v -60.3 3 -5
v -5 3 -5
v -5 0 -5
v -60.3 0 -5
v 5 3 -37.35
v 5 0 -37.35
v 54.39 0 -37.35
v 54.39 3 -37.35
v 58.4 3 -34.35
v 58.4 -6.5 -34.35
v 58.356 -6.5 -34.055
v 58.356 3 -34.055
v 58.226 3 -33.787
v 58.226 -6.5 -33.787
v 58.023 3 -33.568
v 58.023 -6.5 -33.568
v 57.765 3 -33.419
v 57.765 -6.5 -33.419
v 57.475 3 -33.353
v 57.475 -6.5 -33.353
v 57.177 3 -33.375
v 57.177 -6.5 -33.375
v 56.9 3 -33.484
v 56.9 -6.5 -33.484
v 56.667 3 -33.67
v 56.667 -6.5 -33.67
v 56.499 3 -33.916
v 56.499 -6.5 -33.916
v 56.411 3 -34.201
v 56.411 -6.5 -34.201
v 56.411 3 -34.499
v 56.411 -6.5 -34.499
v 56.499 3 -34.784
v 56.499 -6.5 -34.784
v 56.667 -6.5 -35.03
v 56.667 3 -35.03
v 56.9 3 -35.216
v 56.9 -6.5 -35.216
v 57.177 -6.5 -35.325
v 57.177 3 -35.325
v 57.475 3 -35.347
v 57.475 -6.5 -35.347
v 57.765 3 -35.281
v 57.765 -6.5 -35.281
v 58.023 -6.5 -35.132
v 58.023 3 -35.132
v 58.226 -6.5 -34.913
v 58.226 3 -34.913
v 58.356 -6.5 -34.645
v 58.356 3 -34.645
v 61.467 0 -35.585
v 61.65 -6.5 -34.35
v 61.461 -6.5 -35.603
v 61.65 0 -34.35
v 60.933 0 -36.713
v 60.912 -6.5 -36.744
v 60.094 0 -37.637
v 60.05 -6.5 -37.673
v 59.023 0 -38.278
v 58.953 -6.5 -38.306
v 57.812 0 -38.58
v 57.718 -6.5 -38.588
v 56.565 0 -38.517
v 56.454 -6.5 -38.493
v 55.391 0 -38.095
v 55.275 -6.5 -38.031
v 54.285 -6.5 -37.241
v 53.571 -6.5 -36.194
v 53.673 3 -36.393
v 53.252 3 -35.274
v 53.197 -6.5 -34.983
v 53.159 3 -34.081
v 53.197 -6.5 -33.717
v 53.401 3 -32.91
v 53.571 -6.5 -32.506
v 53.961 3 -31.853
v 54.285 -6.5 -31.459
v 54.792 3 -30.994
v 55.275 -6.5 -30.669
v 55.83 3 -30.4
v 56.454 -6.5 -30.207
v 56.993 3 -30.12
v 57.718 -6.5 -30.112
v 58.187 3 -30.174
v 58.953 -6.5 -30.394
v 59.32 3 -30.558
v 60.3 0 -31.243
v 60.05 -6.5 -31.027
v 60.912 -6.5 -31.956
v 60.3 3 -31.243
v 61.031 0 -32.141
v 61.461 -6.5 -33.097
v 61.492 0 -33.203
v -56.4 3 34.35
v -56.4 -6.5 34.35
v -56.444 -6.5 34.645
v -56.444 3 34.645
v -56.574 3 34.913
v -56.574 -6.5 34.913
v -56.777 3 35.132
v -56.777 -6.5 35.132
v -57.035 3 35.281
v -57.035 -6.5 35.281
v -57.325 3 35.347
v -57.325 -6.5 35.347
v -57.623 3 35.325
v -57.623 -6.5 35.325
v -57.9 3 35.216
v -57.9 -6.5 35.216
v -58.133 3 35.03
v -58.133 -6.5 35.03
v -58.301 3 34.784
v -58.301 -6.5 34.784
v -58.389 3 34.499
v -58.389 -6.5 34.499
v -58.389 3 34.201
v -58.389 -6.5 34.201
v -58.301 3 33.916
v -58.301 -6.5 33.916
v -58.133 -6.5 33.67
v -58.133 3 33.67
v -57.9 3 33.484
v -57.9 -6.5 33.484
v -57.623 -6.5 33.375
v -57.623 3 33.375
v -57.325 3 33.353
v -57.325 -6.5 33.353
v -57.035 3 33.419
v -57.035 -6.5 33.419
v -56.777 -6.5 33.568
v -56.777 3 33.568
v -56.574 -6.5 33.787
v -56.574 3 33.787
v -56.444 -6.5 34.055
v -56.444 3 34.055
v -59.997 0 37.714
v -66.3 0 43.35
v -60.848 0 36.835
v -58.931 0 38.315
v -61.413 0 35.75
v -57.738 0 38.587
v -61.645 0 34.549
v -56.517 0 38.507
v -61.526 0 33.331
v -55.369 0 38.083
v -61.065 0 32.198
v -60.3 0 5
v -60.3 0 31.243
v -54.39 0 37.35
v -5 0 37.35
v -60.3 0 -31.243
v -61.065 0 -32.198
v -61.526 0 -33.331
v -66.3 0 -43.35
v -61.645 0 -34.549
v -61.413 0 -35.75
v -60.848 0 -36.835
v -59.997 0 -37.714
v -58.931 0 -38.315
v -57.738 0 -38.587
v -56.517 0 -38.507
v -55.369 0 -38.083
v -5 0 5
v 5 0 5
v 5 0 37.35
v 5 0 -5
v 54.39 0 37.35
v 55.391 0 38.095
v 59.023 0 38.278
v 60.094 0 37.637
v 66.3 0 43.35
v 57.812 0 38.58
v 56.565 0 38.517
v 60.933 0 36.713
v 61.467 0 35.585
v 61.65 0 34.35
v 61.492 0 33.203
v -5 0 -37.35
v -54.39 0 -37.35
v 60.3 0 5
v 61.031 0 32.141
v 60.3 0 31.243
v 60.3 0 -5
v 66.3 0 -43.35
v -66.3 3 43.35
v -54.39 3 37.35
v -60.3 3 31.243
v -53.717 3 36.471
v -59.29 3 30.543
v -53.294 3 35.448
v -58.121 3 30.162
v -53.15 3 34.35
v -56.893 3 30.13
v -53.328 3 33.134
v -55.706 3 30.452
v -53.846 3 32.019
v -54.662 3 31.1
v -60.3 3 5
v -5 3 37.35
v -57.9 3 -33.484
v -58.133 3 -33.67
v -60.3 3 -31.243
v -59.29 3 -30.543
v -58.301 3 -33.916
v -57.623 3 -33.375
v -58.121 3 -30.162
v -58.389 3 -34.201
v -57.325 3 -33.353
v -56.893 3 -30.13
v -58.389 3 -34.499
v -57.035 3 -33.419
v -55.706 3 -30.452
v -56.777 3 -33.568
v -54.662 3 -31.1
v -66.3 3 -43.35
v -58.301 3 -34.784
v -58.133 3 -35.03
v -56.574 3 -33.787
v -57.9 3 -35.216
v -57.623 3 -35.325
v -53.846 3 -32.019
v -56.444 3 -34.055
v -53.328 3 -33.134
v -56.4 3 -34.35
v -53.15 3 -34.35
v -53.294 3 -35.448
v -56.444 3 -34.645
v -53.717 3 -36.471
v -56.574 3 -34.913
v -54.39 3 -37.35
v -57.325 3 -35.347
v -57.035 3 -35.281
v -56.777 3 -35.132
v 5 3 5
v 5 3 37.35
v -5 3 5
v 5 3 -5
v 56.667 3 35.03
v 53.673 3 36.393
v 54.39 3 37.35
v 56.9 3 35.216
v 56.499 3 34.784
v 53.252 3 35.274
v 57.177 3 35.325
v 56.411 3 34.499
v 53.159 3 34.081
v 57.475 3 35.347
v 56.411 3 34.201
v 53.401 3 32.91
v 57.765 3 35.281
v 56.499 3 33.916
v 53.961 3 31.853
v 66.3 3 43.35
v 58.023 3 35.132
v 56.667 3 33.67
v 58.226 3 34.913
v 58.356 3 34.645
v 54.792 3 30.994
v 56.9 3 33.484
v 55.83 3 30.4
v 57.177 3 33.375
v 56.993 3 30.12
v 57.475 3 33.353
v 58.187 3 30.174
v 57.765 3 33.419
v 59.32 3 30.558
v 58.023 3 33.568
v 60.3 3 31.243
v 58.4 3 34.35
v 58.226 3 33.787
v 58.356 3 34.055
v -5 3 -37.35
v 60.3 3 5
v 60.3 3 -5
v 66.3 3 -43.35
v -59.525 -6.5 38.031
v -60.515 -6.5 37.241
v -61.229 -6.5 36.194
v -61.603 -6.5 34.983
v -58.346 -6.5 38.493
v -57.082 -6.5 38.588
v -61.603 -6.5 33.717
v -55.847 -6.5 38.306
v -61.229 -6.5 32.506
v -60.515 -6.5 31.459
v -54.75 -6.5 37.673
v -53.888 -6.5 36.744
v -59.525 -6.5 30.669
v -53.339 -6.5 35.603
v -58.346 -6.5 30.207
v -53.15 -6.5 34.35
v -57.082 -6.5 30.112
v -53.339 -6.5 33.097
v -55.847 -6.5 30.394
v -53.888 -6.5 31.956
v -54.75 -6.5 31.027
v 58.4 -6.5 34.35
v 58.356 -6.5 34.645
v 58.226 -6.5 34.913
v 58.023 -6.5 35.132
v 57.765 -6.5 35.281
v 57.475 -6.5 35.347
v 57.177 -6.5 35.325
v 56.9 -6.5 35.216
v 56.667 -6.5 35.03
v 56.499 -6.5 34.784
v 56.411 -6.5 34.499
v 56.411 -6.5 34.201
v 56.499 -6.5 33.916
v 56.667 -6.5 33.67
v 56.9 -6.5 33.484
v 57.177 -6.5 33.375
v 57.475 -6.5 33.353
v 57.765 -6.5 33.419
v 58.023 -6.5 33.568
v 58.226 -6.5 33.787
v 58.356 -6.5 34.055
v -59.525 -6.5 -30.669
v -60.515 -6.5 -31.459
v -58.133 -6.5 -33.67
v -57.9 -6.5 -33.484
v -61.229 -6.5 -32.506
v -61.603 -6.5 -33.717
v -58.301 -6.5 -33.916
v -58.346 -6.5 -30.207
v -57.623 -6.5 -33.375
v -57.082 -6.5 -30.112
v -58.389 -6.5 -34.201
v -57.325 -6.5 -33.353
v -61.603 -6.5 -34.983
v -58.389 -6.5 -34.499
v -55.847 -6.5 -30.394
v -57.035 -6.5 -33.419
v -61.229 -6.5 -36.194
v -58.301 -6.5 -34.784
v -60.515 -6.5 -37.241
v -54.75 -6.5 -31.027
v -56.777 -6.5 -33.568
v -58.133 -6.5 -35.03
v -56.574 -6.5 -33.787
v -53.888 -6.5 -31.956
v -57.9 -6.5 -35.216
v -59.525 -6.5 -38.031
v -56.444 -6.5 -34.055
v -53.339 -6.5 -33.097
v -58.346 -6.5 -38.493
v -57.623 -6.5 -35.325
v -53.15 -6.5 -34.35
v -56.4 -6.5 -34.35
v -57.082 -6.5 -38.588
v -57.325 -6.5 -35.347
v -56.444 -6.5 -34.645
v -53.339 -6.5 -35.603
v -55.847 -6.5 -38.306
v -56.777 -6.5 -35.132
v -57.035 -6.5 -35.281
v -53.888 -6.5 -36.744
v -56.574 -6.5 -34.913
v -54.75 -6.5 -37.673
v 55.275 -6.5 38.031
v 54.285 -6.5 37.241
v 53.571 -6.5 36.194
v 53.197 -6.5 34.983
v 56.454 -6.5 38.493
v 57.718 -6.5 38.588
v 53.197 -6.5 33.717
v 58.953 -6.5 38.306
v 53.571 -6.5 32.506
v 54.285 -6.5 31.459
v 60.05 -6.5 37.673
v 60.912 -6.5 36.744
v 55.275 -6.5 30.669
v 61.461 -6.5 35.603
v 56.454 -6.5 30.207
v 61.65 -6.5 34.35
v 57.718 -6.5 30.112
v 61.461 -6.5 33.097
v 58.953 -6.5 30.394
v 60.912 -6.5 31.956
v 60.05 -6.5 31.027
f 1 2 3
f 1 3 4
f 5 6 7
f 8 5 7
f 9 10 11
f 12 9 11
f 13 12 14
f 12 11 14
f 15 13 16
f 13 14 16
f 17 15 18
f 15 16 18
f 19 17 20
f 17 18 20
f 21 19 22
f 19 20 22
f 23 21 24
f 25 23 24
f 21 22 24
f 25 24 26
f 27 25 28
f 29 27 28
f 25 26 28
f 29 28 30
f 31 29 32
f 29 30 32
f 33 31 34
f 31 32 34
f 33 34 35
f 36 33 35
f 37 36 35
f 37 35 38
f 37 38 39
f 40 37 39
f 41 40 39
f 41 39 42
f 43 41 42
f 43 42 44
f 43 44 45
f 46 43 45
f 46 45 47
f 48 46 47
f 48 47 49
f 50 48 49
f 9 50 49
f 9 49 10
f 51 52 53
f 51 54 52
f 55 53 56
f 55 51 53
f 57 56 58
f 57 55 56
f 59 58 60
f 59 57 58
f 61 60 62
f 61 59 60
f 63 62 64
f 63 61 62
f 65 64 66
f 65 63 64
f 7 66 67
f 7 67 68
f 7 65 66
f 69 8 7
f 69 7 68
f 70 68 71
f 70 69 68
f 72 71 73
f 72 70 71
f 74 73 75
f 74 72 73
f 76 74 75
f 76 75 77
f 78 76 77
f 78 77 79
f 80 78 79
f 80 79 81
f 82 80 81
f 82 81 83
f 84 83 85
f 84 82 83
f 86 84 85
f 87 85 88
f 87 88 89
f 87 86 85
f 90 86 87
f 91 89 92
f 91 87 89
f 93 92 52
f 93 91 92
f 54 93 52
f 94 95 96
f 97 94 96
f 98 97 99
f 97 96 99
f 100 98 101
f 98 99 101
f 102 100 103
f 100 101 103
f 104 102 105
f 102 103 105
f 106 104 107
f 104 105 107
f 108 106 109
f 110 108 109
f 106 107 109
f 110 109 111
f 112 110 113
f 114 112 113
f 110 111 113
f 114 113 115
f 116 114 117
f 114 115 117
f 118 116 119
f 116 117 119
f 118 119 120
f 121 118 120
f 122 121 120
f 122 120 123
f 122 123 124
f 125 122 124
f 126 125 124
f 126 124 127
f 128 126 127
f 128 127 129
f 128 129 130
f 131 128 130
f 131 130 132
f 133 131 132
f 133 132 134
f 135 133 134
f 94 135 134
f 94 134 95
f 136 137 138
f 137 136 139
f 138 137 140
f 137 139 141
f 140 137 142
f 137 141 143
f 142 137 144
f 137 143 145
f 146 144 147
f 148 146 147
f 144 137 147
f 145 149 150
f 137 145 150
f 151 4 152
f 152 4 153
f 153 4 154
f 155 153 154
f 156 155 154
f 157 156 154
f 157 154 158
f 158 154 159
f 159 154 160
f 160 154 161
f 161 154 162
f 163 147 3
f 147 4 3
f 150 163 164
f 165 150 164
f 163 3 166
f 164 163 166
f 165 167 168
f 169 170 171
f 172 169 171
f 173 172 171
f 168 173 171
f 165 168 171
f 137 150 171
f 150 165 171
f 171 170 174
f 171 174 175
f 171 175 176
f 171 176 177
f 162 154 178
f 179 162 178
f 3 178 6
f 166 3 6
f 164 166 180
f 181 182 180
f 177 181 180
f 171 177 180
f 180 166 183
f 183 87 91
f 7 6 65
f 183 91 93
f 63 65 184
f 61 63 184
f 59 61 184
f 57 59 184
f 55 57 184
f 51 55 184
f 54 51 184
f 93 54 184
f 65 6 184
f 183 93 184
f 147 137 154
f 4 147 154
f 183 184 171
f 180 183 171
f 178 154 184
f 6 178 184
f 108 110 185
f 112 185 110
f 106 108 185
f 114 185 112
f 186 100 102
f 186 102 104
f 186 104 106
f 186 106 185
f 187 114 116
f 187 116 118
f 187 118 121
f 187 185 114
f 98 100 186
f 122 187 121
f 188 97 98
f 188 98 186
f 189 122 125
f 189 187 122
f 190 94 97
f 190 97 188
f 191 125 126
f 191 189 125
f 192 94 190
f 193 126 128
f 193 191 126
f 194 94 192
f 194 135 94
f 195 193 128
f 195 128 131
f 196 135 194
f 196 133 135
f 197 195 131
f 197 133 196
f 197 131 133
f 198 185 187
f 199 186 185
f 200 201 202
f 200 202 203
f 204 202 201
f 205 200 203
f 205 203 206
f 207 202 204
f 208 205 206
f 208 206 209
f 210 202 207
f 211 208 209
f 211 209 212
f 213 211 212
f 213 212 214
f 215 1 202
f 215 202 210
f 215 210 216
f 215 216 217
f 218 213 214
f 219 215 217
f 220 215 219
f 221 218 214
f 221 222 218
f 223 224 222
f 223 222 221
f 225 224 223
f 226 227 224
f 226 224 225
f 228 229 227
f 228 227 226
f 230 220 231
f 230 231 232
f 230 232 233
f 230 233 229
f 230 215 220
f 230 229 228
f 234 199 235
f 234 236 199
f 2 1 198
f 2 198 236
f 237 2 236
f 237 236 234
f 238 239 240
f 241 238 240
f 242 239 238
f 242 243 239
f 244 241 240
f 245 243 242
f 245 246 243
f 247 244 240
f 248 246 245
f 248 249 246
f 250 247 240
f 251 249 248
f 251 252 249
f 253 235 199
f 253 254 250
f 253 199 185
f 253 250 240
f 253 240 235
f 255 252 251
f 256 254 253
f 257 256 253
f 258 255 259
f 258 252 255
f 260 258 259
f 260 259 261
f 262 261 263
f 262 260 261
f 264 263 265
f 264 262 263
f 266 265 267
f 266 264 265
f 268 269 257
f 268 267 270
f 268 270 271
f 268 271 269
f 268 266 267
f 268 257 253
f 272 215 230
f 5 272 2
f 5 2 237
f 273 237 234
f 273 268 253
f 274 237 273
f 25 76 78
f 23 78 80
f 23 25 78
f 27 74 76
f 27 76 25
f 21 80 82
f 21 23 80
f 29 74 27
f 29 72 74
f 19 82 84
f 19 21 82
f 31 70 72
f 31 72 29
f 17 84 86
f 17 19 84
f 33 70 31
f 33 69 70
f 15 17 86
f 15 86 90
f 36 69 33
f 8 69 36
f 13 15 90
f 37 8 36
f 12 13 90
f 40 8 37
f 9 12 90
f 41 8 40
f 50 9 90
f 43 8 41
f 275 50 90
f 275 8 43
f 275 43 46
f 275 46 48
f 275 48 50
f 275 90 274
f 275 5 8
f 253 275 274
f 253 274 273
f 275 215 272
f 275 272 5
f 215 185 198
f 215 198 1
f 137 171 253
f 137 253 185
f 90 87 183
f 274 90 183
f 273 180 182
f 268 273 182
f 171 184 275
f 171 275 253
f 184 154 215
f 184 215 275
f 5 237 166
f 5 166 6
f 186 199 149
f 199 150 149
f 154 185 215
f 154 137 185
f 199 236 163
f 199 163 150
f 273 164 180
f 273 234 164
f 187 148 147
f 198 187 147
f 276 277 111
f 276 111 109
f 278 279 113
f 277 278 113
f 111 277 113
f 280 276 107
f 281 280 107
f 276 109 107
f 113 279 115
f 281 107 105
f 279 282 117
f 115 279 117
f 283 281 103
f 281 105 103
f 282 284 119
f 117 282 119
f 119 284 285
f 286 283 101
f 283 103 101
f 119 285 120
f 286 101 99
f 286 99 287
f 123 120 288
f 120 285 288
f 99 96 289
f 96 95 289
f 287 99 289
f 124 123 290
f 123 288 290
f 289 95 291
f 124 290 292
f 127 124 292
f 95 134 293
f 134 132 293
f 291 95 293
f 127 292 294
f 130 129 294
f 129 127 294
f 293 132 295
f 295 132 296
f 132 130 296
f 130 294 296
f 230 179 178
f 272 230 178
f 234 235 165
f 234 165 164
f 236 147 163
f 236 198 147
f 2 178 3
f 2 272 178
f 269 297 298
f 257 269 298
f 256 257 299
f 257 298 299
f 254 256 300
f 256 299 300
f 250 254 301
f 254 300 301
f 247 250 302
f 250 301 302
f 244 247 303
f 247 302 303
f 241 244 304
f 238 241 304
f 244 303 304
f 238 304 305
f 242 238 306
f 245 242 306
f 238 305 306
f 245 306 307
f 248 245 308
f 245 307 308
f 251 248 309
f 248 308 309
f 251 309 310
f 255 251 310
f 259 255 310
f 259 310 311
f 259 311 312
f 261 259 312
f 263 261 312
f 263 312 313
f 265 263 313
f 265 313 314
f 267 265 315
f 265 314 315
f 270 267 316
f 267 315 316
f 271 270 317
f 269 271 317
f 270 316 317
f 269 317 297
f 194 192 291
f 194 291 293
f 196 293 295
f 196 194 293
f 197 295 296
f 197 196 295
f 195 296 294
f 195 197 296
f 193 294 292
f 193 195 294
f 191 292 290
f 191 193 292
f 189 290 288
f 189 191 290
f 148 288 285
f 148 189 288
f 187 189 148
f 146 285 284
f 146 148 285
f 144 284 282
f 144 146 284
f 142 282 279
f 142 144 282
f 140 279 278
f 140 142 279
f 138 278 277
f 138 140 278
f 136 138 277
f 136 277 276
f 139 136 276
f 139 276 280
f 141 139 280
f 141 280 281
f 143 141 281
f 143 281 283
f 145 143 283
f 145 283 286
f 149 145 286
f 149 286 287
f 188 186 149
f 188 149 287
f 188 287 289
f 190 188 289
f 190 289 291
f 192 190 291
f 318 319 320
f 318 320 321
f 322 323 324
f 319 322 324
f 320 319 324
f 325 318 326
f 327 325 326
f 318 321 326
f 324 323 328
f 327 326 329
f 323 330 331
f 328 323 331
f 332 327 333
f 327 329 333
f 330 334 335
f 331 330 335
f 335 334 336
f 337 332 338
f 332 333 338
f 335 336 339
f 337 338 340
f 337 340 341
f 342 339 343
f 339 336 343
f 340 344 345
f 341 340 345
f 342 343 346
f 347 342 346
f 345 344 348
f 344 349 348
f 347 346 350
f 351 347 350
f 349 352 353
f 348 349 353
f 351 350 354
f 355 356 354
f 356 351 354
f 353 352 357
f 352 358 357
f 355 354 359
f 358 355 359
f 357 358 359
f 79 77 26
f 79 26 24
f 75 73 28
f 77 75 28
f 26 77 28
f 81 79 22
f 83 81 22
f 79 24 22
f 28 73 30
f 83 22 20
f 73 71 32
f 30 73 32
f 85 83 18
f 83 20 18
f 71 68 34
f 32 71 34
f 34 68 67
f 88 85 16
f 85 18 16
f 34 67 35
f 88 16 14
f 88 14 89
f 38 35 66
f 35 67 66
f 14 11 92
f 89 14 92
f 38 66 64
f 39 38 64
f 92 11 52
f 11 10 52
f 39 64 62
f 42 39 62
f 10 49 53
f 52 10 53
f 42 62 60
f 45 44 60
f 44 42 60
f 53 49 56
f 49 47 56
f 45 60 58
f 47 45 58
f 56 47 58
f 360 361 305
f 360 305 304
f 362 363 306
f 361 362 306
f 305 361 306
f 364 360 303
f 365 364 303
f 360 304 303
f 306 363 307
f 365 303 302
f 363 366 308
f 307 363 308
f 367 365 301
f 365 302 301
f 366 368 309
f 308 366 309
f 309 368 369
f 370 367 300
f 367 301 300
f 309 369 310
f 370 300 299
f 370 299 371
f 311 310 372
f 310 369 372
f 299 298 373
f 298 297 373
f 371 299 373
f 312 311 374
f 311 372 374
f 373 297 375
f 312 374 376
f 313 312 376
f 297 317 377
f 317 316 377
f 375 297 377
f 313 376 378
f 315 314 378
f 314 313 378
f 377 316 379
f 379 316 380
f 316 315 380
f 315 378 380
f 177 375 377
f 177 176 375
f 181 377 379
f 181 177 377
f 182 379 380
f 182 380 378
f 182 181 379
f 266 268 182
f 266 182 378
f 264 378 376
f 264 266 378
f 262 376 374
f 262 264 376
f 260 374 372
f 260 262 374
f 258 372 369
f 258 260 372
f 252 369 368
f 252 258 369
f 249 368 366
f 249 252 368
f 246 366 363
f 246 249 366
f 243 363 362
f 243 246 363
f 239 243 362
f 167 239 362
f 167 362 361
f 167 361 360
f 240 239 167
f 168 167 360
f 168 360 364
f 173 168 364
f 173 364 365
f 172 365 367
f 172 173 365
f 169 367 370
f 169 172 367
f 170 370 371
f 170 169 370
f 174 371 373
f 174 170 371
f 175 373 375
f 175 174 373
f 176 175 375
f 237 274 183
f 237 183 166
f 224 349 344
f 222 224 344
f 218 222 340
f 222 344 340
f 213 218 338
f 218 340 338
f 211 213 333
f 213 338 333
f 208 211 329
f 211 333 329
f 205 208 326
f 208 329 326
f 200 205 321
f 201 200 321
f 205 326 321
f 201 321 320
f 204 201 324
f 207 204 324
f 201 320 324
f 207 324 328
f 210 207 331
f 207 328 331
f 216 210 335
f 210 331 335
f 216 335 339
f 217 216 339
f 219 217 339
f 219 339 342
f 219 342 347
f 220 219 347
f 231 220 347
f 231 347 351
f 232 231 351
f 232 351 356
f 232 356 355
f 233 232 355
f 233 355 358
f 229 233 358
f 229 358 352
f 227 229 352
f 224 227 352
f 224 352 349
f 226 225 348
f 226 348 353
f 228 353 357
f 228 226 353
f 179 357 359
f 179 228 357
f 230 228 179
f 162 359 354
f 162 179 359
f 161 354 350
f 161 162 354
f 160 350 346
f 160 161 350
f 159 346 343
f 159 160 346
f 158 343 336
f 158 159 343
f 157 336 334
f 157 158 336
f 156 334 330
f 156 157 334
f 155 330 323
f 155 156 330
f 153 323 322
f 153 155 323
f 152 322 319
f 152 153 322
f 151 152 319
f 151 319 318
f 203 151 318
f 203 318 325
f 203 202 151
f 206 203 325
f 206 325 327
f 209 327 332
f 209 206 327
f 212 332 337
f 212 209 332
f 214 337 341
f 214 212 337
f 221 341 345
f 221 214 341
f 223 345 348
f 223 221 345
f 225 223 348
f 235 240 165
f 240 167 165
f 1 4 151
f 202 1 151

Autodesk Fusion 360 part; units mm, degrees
sketch "Sketch1" plane through (0, 0, 0) normal (0, 1, 0) x (1, 0, 0)
  line L0 (60.3, -37.35) -> (-60.3, -37.35)
  line L1 (-60.3, -37.35) -> (-60.3, 31.2432)
  line L2 (-60.3, 37.35) -> (60.3, 37.35)
  line L3 (60.3, 37.35) -> (60.3, -37.35)
  line L4 (60.3, -37.35) -> (-60.3, 37.35) construction
  line L5 (-60.3, -37.35) -> (60.3, 37.35) construction
  line L6 (-66.3, 43.35) -> (66.3, 43.35)
  line L7 (66.3, 43.35) -> (66.3, -43.35)
  line L8 (66.3, -43.35) -> (-66.3, -43.35)
  line L9 (-66.3, -43.35) -> (-66.3, 43.35)
  line L10 (-60.3, -37.35) -> (-54.5, -37.35)
  line L11 (-60.3, -31.35) -> (-60.3, -37.35)
  line L12 (60.3, -37.35) -> (54.5, -37.35)
  line L13 (60.3, -31.35) -> (60.3, -37.35)
  line L14 (-60.3, 37.35) -> (-54.5, 37.35)
  line L15 (-60.3, 31.35) -> (-60.3, 37.35)
  line L16 (60.3, 37.35) -> (54.5, 37.35)
  line L17 (60.3, 31.35) -> (60.3, 37.35)
  circle A0 centre (-57.4, -34.35) radius 1
  circle A1 centre (57.4, -34.35) radius 1
  line L18 (2.5, 0) -> (20, 0)
  circle A2 centre (57.4, 34.35) radius 1
  circle A3 centre (-57.4, 34.35) radius 1
  circle A4 centre (0, -40.35) radius 1
  circle A5 centre (0, 40.35) radius 1
  circle A6 centre (57.4, -34.35) radius 4.25
  circle A7 centre (57.4, 34.35) radius 4.25
  circle A8 centre (-57.4, 34.35) radius 4.25
  circle A9 centre (-57.4, -34.35) radius 4.25
  point P0 (-57.4, 34.35)
  dimension "d1" = 120.6
  dimension "d2" = 74.7
  dimension "d6" = 5.8
  dimension "d7" = 6
  dimension "d8" = 5.8
  dimension "d9" = 6
  dimension "d10" = 5.8
  dimension "d11" = 6
  dimension "d12" = 5.8
  dimension "d13" = 6
  dimension "d16" = 2
  dimension "d17" = 2
  dimension "d18" = 2
  dimension "d22" = 2
  dimension "d23" = 8.5
  dimension "d24" = 8.5
  dimension "d25" = 8.5
  dimension "d26" = 8.5
extrude "Extrude1" add sketch "Sketch1" along normal blind 3 contours L0 L3 L12 L13 A6 | L0 L3 L12 L13 A6 | L0 L1 L2 L3 A6 A7 A8 A9 | L0 L1 L10 L11 A9 | L0 L1 L10 L11 A9 | L2 L3 L16 L17 A7 | L2 L3 L16 L17 A7 | A8 | L6 L7 L8 L9 | A0 | A1 | A2 | A3 | A4 | A5
extrude "Extrude3" cut sketch "Sketch1" along normal blind 10 contours A0 | A1 | A2 | A3
extrude "Extrude4" add sketch "Sketch1" against normal blind 6.5 contours L0 L3 L12 L13 A6 | L0 L3 L12 L13 A6 | L0 L1 L10 L11 A9 | L0 L1 L10 L11 A9 | L2 L3 L16 L17 A7 | L2 L3 L16 L17 A7 | A8
sketch "Sketch2" plane through (0, 0, 0) normal (0, 1, 0) x (1, 0, 0)
extrude "Extrude5" cut sketch "Sketch1" along normal blind 10 contours L0 L1 L2 L3 A6 A7 A8 A9
sketch "Sketch3" plane through (0, 3, 0) normal (0, 1, 0) x (-1, 0, 0)
  arc A0 (54.3896, 37.35) -> (60.3, 31.2432) centre (57.4, 34.35) ccw
  line L0 (60.3, 31.2432) -> (60.3, -31.2432)
  arc A1 (60.3, -31.2432) -> (54.3896, -37.35) centre (57.4, -34.35) ccw
  line L1 (54.3896, -37.35) -> (-54.3896, -37.35)
  arc A2 (-54.3896, -37.35) -> (-60.3, -31.2432) centre (-57.4, -34.35) ccw
  line L2 (-60.3, -31.2432) -> (-60.3, 31.2432)
  arc A3 (-60.3, 31.2432) -> (-54.3896, 37.35) centre (-57.4, 34.35) ccw
  line L3 (-54.3896, 37.35) -> (54.3896, 37.35)
  circle A4 centre (57.4, -34.35) radius 1
  circle A5 centre (57.4, 34.35) radius 1
  circle A6 centre (-57.4, -34.35) radius 1
  circle A7 centre (-57.4, 34.35) radius 1
  line L4 (66.3, 43.35) -> (-66.3, 43.35)
  line L5 (-66.3, 43.35) -> (-66.3, -43.35)
  line L6 (-66.3, -43.35) -> (66.3, -43.35)
  line L7 (66.3, -43.35) -> (66.3, 43.35)
  line L8 (-5, -37.35) -> (5, -37.35)
  line L9 (5, -37.35) -> (5, 37.35)
  line L10 (5, 37.35) -> (-5, 37.35)
  line L11 (-5, 37.35) -> (-5, -37.35)
  line L12 (-5, -37.35) -> (5, 37.35) construction
  line L13 (5, -37.35) -> (-5, 37.35) construction
  line L14 (60.3, 5) -> (-60.3, 5)
  line L15 (-60.3, 5) -> (-60.3, -5)
  line L16 (-60.3, -5) -> (60.3, -5)
  line L17 (60.3, -5) -> (60.3, 5)
  line L18 (60.3, 5) -> (-60.3, -5) construction
  line L19 (-60.3, 5) -> (60.3, -5) construction
  dimension "d31" = 10
  dimension "d32" = 10
extrude "Extrude6" add sketch "Sketch3" against normal blind 3 contours L3 L9 L10 L11 L14 | L0 L9 L14 L16 L17 | L9 L11 L14 L16 | L2 L11 L14 L15 L16 | L1 L8 L9 L11 L16
